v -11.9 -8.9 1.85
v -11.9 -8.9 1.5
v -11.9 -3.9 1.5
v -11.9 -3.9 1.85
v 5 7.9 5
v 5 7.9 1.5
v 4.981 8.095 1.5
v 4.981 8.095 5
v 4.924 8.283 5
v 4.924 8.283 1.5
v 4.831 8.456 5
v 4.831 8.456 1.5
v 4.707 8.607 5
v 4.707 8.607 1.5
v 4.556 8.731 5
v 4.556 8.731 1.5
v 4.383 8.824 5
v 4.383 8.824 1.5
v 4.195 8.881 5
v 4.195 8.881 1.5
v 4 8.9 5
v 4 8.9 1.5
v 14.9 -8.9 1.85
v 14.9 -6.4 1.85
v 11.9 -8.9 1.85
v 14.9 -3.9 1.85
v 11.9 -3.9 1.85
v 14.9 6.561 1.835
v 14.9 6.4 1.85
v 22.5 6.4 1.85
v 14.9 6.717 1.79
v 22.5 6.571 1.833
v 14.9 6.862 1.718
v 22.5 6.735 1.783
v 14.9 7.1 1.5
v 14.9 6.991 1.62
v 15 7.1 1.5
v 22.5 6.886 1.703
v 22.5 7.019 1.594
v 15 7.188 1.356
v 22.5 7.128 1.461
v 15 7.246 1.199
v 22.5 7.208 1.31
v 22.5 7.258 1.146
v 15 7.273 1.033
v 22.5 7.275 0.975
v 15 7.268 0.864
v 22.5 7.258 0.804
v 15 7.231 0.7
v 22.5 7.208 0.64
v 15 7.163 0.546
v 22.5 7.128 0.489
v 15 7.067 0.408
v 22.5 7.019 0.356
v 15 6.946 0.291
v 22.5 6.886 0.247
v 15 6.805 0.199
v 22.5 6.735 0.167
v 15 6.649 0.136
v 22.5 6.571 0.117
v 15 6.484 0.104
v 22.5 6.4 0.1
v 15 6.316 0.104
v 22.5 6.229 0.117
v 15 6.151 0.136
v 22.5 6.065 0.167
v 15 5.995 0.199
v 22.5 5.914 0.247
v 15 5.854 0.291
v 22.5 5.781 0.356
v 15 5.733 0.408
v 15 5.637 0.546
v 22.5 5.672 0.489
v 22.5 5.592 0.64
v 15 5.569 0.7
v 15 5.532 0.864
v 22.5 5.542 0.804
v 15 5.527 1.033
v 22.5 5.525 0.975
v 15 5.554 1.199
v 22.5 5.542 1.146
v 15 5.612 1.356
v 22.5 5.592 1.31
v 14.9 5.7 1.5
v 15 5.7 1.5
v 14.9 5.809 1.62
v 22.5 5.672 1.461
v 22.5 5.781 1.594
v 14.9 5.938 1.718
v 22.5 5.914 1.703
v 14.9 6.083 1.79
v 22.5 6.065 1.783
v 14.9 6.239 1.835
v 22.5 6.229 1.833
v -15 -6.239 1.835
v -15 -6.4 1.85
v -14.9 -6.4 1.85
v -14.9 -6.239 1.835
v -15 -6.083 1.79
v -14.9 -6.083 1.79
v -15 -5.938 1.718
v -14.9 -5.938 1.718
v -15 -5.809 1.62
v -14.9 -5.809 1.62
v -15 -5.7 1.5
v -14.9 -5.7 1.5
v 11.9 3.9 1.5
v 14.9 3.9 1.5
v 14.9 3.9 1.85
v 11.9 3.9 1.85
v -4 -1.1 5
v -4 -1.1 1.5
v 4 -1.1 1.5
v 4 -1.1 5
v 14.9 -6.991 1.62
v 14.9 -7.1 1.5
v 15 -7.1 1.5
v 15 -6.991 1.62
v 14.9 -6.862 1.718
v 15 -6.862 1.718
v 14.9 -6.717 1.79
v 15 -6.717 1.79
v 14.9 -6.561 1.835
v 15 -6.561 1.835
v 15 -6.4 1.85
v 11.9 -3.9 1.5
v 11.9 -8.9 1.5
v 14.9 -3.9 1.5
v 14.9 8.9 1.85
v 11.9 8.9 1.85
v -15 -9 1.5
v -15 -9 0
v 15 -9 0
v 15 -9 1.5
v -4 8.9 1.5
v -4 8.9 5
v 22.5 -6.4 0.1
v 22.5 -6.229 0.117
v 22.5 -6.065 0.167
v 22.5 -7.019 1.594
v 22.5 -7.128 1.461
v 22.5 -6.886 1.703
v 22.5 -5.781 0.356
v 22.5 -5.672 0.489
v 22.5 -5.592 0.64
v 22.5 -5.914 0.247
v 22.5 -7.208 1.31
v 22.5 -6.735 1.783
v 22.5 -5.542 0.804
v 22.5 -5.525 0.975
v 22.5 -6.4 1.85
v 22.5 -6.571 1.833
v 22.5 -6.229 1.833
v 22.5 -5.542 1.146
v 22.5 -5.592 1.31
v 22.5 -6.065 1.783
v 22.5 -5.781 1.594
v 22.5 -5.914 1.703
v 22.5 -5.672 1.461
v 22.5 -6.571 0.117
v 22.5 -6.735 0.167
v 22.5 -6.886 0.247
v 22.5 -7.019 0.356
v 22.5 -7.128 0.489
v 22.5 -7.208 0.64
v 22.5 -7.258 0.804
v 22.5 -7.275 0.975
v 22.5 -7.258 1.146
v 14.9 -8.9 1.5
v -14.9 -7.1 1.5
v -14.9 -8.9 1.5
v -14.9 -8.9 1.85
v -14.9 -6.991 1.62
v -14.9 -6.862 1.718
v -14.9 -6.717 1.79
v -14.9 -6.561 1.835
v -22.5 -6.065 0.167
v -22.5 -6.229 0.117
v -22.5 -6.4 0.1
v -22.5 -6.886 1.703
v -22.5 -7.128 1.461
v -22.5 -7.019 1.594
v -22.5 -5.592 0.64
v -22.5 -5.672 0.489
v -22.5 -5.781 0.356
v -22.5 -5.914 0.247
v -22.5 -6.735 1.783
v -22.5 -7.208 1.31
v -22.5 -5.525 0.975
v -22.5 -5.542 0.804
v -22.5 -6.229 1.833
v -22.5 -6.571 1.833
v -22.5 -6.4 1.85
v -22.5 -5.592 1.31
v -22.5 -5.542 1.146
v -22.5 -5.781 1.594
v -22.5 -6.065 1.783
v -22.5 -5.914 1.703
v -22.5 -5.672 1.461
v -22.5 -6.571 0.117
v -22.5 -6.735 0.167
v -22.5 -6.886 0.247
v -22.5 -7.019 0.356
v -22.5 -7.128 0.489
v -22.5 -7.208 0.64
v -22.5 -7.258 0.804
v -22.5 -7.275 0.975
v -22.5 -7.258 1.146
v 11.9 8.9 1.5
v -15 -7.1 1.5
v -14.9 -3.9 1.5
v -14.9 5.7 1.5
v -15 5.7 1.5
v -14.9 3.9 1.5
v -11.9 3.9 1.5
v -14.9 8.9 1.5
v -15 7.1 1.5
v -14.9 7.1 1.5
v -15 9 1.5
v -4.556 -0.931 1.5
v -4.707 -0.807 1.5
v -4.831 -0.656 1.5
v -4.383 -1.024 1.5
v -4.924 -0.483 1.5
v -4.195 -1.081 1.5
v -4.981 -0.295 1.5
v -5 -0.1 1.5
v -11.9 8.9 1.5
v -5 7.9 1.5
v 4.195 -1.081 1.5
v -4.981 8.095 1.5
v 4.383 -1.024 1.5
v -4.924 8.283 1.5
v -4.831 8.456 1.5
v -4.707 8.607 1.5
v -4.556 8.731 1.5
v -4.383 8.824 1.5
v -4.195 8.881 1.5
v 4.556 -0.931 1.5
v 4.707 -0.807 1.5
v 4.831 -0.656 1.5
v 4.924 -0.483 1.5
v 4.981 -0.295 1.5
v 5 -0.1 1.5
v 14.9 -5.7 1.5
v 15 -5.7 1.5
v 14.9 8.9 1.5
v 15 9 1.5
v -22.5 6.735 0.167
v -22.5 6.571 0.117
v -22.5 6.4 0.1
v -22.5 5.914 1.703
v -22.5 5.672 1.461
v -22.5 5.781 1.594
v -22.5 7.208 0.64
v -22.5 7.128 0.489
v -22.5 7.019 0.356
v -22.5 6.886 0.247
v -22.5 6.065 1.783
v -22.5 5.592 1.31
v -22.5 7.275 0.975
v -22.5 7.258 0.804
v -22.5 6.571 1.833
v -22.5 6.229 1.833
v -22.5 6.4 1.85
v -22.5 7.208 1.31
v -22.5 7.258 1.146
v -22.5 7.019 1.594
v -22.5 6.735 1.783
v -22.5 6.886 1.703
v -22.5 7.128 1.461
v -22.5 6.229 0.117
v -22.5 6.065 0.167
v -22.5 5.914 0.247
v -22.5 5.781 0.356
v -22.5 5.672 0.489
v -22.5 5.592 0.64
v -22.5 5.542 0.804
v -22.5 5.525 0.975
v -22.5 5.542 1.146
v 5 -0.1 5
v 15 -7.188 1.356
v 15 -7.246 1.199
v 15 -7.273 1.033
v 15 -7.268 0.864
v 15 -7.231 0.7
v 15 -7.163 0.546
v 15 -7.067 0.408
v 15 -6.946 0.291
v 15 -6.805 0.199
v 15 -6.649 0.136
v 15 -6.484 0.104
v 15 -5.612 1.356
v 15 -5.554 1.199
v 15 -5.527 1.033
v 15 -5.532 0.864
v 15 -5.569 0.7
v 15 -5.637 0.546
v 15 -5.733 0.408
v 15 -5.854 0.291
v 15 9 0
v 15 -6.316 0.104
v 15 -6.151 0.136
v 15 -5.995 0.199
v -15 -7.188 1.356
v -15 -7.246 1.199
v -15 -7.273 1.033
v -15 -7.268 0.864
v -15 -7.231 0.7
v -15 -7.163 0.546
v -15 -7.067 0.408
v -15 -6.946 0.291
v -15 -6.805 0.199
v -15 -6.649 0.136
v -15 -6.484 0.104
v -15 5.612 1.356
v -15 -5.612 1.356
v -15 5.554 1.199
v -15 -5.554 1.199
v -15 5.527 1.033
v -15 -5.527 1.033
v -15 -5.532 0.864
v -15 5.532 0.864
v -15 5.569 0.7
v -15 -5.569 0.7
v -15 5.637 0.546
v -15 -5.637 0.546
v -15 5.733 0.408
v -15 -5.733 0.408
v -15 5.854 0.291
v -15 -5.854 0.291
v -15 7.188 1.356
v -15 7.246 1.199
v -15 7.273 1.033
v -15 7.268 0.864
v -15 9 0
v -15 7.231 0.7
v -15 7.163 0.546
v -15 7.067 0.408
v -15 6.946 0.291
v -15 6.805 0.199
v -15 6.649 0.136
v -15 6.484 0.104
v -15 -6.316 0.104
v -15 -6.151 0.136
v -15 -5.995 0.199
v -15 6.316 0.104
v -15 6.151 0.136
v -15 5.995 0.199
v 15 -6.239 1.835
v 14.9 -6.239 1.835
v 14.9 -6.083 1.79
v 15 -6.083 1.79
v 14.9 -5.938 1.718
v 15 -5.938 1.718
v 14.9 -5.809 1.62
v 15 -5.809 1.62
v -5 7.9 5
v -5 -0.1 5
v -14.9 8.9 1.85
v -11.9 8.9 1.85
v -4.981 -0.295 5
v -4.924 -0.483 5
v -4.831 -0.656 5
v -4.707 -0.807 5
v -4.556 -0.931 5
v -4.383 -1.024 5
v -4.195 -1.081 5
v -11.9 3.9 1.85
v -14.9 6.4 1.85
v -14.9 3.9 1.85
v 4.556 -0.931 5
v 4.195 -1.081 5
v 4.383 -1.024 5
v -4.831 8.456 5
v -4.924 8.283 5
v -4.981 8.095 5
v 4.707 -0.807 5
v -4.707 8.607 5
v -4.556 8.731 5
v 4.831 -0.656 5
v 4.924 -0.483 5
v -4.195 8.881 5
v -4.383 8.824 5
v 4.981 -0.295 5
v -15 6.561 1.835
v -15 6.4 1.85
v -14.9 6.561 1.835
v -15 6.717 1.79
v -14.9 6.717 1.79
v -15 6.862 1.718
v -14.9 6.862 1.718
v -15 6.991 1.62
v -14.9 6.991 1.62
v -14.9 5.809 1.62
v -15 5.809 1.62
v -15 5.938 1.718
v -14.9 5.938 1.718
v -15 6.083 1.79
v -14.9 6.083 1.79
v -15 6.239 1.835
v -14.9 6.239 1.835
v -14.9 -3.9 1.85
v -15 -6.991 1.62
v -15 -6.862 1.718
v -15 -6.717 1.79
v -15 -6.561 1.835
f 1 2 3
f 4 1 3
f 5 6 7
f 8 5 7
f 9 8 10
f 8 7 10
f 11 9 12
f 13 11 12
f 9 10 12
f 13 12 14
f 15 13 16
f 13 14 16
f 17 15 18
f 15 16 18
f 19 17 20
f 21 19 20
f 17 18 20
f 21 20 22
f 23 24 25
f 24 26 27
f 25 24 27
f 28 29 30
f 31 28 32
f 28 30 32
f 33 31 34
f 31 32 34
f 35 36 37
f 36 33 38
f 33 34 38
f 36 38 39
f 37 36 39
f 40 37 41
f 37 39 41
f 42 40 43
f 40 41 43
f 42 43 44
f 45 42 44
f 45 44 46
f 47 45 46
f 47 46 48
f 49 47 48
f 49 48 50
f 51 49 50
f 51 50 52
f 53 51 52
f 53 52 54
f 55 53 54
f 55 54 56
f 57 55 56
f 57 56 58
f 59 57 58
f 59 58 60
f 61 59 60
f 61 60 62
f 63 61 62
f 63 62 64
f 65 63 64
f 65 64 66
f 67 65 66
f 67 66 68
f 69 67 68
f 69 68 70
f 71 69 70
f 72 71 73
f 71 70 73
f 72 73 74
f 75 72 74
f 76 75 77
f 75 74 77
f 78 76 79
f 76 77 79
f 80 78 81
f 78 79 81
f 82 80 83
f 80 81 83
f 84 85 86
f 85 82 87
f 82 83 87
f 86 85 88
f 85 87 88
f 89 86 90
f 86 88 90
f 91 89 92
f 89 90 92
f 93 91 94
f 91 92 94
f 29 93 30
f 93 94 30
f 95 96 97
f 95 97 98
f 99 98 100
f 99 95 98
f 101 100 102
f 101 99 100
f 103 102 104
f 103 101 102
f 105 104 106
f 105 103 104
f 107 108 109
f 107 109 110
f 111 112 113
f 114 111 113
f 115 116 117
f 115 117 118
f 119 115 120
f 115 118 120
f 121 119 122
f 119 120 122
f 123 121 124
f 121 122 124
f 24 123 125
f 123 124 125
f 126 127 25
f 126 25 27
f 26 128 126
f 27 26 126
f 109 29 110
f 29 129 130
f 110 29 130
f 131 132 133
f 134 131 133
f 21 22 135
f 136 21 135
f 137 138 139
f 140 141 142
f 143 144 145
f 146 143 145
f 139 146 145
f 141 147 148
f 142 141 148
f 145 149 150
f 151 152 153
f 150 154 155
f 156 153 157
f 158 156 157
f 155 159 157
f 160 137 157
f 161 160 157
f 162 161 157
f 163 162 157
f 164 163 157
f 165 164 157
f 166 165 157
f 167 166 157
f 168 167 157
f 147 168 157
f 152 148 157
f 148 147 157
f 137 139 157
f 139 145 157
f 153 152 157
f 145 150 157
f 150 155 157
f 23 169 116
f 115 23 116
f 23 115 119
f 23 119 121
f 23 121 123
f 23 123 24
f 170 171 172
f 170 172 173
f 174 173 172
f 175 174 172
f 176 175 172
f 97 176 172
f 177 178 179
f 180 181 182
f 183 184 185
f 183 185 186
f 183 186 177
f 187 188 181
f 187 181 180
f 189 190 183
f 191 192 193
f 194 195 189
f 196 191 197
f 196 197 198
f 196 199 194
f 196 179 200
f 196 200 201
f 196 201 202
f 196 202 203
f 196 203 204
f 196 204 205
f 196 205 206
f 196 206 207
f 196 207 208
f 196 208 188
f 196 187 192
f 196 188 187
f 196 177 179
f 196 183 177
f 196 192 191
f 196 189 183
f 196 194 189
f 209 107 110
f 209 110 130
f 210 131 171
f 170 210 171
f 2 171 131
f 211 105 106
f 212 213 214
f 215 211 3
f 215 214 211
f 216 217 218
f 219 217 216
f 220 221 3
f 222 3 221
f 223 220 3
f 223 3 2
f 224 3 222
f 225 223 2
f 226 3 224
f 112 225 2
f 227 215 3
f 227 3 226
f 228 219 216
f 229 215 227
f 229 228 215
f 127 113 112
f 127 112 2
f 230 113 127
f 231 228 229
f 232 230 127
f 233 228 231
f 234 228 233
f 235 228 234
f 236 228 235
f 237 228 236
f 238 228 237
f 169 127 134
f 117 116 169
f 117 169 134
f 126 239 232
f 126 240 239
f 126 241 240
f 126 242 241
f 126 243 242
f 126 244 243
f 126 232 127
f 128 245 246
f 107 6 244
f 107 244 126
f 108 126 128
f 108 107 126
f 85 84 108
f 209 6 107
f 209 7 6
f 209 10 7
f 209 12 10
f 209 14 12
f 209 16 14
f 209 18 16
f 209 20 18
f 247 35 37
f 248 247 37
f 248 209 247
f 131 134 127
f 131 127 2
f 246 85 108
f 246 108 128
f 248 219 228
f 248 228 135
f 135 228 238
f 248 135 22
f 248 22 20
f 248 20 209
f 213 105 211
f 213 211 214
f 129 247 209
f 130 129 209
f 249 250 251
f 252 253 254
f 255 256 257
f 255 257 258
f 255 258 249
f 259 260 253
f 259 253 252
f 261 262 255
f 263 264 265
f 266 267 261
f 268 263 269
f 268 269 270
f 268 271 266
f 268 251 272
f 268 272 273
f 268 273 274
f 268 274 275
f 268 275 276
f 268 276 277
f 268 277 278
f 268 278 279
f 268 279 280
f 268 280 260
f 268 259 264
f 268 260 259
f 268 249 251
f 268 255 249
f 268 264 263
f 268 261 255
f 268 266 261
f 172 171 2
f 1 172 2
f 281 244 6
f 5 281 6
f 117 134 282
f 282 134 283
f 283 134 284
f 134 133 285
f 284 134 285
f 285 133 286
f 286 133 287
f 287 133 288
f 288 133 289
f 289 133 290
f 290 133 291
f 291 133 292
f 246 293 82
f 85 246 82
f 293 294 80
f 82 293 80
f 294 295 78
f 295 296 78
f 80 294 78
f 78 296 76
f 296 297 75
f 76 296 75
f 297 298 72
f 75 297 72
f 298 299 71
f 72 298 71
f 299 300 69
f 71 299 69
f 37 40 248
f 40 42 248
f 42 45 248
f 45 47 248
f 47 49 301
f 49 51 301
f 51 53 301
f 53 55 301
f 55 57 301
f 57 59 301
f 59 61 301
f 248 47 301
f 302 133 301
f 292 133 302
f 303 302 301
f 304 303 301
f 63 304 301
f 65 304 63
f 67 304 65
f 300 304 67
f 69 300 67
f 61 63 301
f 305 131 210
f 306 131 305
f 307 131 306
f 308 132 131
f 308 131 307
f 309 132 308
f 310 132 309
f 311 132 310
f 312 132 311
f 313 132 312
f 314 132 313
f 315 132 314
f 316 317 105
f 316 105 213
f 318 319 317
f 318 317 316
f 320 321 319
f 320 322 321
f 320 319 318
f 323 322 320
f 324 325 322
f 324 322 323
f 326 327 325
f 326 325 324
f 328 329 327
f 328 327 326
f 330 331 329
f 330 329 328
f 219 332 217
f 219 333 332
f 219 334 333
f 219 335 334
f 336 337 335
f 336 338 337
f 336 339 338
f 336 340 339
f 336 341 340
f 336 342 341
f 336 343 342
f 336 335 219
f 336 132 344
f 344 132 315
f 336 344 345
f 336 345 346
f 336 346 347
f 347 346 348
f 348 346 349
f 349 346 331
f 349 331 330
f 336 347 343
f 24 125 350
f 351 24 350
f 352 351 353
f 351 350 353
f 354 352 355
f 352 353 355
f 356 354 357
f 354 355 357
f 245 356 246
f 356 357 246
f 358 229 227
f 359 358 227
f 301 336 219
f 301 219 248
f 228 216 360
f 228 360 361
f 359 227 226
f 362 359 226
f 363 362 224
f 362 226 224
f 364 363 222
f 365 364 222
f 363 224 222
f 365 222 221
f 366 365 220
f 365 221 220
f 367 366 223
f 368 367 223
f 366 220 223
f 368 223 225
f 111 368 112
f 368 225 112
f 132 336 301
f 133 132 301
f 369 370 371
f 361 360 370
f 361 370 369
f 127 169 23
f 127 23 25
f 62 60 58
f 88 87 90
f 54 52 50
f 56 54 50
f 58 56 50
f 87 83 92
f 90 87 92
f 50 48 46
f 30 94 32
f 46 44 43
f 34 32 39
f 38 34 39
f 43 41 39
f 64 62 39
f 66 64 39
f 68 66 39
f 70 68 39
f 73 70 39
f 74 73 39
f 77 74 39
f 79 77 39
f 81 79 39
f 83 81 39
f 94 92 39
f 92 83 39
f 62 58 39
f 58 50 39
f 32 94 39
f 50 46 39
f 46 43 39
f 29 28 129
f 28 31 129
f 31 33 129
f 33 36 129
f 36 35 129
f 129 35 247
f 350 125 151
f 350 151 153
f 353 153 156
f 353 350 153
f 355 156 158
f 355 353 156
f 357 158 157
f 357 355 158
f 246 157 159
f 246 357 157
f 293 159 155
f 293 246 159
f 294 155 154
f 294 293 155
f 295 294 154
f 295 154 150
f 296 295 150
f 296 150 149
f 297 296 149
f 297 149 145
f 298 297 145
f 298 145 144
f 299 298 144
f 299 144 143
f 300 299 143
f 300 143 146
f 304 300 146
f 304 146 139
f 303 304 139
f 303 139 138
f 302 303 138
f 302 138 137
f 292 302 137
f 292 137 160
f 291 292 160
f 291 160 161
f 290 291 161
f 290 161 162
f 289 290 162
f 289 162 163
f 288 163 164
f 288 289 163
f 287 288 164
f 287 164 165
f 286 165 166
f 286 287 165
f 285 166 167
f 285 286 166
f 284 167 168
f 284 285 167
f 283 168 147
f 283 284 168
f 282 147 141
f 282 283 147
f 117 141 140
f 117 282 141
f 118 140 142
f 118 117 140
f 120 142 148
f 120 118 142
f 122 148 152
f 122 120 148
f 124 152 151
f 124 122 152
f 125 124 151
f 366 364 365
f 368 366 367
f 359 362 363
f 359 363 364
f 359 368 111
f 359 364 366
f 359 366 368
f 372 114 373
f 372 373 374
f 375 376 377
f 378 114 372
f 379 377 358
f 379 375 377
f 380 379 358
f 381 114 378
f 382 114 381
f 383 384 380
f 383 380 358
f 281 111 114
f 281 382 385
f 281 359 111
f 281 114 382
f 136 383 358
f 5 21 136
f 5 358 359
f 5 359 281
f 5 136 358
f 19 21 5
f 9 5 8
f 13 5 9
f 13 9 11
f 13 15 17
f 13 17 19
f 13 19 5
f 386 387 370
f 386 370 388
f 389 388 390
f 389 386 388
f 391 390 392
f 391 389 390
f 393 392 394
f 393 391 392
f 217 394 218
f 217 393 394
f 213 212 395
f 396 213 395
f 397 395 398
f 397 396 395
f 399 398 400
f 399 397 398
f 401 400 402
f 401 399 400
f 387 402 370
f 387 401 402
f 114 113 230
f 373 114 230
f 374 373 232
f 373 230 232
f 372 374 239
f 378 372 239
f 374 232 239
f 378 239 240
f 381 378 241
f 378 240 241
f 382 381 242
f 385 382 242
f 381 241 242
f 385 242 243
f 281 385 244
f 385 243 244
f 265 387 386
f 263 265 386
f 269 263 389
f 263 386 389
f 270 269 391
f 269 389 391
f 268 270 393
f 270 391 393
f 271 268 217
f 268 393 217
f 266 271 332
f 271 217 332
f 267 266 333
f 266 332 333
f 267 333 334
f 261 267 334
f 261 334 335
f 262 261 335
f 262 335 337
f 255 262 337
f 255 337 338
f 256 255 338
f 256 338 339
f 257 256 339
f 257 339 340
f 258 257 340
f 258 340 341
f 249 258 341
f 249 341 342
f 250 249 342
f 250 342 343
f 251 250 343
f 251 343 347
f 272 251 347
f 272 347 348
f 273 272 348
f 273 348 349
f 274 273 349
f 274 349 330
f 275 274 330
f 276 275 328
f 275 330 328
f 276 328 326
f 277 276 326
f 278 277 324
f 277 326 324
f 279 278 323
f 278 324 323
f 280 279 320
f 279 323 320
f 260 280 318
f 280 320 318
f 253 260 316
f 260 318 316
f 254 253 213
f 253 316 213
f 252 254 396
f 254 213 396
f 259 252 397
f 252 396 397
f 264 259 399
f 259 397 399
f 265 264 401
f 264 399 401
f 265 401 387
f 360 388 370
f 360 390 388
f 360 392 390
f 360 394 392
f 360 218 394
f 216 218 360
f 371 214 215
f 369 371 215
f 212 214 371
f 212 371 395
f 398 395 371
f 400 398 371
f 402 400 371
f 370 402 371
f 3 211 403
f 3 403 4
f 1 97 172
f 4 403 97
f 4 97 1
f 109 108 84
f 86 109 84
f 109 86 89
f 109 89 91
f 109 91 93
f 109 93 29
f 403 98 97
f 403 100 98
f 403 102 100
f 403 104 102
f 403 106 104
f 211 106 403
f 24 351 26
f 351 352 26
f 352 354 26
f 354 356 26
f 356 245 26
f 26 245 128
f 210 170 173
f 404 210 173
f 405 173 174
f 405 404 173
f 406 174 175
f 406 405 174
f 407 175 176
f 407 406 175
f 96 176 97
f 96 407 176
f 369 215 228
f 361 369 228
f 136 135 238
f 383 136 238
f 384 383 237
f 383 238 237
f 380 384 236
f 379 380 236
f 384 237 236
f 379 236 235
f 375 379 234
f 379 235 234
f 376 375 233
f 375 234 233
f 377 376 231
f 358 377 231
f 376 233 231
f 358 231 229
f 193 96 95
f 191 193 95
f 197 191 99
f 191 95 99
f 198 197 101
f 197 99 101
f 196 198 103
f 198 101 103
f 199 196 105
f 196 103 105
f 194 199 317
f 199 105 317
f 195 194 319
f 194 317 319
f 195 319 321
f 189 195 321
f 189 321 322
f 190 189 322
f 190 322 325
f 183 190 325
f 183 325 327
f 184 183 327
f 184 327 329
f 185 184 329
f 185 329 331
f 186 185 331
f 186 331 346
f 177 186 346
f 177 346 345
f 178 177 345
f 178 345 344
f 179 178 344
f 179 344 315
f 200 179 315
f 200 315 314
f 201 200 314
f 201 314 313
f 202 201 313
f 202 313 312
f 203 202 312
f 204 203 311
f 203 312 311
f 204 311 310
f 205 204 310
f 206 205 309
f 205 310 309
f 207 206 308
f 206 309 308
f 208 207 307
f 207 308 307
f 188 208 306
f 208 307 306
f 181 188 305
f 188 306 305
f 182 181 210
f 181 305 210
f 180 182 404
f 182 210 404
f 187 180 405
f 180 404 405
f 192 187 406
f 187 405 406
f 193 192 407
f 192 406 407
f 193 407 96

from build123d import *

# Parameters (mm, degrees)
SKETCH1_W                       = 30
SKETCH1_H                       = 18
BOSS_EXTRUDE1_DEPTH             = 1.5
BOSS_EXTRUDE2_DEPTH             = 3.5
SKETCH3_W                       = 3
SKETCH3_H                       = 5
BOSS_EXTRUDE3_DEPTH             = 0.35
SKETCH4_R                       = 0.875
BOSS_EXTRUDE4_DEPTH             = 7.5
BOSS_EXTRUDE4_DIRECTION_2_REACH = 33.718


with BuildPart() as part:
    # Sketch1 → Boss-Extrude1 (new body)
    with BuildSketch(Plane.XY):
        Rectangle(SKETCH1_W, SKETCH1_H)
    extrude(amount=BOSS_EXTRUDE1_DEPTH)

    # Sketch2 → Boss-Extrude2 (add)
    with BuildSketch(Plane.XY.offset(1.5)):
        with BuildLine():
            Line((-4, -1.1), (4, -1.1))
            ThreePointArc((4, -1.1), (4.707106781, -0.807106781), (5, -0.1))
            Line((5, -0.1), (5, 7.9))
            ThreePointArc((5, 7.9), (4.707106781, 8.607106781), (4, 8.9))
            Line((4, 8.9), (-4, 8.9))
            ThreePointArc((-4, 8.9), (-4.707106781, 8.607106781), (-5, 7.9))
            Line((-5, 7.9), (-5, -0.1))
            ThreePointArc((-5, -0.1), (-4.707106781, -0.807106781), (-4, -1.1))
        make_face()
    extrude(amount=BOSS_EXTRUDE2_DEPTH)

    # Sketch3 → Boss-Extrude3 (add)
    with BuildSketch(Plane.XY.offset(1.5)):
        with Locations((-13.4, 6.4)):
            Rectangle(SKETCH3_W, SKETCH3_H)
        with Locations((-13.4, -6.4)):
            Rectangle(SKETCH3_W, SKETCH3_H)
    boss_extrude3 = extrude(amount=BOSS_EXTRUDE3_DEPTH)

    # Sketch4 → Boss-Extrude4 (add)
    with BuildSketch(Plane.ZY.offset(15)):
        with Locations((0.975, 6.4)):
            Circle(SKETCH4_R)
        with Locations((0.975, -6.4)):
            Circle(SKETCH4_R)
    boss_extrude4 = extrude(amount=BOSS_EXTRUDE4_DEPTH)

    # Boss-Extrude4 direction 2: up to this face of the body (flat: up to its plane)
    boss_extrude4_direction_2_end = Plane(part.part.faces().sort_by_distance((-14.9, -6.4, 1.675))[0])
    # Sketch4 → Boss-Extrude4 direction 2 (add, up to the picked face)
    with BuildSketch(Plane.ZY.offset(15), mode=Mode.PRIVATE) as boss_extrude4_direction_2_sk1:
        with Locations((0.975, 6.4)):
            Circle(SKETCH4_R)
    boss_extrude4_direction_2_tool1 = split(extrude(boss_extrude4_direction_2_sk1.sketch, amount=-BOSS_EXTRUDE4_DIRECTION_2_REACH, mode=Mode.PRIVATE), bisect_by=boss_extrude4_direction_2_end, keep=Keep.BOTH, mode=Mode.PRIVATE)
    # Sketch4 → Boss-Extrude4 direction 2 (add, up to the picked face)
    with BuildSketch(Plane.ZY.offset(15), mode=Mode.PRIVATE) as boss_extrude4_direction_2_sk2:
        with Locations((0.975, -6.4)):
            Circle(SKETCH4_R)
    boss_extrude4_direction_2_tool2 = split(extrude(boss_extrude4_direction_2_sk2.sketch, amount=-BOSS_EXTRUDE4_DIRECTION_2_REACH, mode=Mode.PRIVATE), bisect_by=boss_extrude4_direction_2_end, keep=Keep.BOTH, mode=Mode.PRIVATE)
    boss_extrude4_direction_2_1 = boss_extrude4_direction_2_tool1.solids().sort_by(Axis((-15, 6.4, 0.975), (1, 0, 0)))[0]
    add(boss_extrude4_direction_2_1)
    boss_extrude4_direction_2_2 = boss_extrude4_direction_2_tool2.solids().sort_by(Axis((-15, -6.4, 0.975), (1, 0, 0)))[0]
    add(boss_extrude4_direction_2_2)
    boss_extrude4_direction_2 = boss_extrude4_direction_2_1 + boss_extrude4_direction_2_2  # Boss-Extrude4 direction 2 as one shape, for the pattern or mirror that repeats it

    # Mirror2: Boss-Extrude3, Boss-Extrude4, Boss-Extrude4 direction 2 across plane
    add(boss_extrude3.mirror(Plane(origin=(0, 0, 0), x_dir=(0, 0, 1), z_dir=(1, 0, 0))))
    add(boss_extrude4.mirror(Plane(origin=(0, 0, 0), x_dir=(0, 0, 1), z_dir=(1, 0, 0))))
    add(boss_extrude4_direction_2.mirror(Plane(origin=(0, 0, 0), x_dir=(0, 0, 1), z_dir=(1, 0, 0))))


solid = part.part
